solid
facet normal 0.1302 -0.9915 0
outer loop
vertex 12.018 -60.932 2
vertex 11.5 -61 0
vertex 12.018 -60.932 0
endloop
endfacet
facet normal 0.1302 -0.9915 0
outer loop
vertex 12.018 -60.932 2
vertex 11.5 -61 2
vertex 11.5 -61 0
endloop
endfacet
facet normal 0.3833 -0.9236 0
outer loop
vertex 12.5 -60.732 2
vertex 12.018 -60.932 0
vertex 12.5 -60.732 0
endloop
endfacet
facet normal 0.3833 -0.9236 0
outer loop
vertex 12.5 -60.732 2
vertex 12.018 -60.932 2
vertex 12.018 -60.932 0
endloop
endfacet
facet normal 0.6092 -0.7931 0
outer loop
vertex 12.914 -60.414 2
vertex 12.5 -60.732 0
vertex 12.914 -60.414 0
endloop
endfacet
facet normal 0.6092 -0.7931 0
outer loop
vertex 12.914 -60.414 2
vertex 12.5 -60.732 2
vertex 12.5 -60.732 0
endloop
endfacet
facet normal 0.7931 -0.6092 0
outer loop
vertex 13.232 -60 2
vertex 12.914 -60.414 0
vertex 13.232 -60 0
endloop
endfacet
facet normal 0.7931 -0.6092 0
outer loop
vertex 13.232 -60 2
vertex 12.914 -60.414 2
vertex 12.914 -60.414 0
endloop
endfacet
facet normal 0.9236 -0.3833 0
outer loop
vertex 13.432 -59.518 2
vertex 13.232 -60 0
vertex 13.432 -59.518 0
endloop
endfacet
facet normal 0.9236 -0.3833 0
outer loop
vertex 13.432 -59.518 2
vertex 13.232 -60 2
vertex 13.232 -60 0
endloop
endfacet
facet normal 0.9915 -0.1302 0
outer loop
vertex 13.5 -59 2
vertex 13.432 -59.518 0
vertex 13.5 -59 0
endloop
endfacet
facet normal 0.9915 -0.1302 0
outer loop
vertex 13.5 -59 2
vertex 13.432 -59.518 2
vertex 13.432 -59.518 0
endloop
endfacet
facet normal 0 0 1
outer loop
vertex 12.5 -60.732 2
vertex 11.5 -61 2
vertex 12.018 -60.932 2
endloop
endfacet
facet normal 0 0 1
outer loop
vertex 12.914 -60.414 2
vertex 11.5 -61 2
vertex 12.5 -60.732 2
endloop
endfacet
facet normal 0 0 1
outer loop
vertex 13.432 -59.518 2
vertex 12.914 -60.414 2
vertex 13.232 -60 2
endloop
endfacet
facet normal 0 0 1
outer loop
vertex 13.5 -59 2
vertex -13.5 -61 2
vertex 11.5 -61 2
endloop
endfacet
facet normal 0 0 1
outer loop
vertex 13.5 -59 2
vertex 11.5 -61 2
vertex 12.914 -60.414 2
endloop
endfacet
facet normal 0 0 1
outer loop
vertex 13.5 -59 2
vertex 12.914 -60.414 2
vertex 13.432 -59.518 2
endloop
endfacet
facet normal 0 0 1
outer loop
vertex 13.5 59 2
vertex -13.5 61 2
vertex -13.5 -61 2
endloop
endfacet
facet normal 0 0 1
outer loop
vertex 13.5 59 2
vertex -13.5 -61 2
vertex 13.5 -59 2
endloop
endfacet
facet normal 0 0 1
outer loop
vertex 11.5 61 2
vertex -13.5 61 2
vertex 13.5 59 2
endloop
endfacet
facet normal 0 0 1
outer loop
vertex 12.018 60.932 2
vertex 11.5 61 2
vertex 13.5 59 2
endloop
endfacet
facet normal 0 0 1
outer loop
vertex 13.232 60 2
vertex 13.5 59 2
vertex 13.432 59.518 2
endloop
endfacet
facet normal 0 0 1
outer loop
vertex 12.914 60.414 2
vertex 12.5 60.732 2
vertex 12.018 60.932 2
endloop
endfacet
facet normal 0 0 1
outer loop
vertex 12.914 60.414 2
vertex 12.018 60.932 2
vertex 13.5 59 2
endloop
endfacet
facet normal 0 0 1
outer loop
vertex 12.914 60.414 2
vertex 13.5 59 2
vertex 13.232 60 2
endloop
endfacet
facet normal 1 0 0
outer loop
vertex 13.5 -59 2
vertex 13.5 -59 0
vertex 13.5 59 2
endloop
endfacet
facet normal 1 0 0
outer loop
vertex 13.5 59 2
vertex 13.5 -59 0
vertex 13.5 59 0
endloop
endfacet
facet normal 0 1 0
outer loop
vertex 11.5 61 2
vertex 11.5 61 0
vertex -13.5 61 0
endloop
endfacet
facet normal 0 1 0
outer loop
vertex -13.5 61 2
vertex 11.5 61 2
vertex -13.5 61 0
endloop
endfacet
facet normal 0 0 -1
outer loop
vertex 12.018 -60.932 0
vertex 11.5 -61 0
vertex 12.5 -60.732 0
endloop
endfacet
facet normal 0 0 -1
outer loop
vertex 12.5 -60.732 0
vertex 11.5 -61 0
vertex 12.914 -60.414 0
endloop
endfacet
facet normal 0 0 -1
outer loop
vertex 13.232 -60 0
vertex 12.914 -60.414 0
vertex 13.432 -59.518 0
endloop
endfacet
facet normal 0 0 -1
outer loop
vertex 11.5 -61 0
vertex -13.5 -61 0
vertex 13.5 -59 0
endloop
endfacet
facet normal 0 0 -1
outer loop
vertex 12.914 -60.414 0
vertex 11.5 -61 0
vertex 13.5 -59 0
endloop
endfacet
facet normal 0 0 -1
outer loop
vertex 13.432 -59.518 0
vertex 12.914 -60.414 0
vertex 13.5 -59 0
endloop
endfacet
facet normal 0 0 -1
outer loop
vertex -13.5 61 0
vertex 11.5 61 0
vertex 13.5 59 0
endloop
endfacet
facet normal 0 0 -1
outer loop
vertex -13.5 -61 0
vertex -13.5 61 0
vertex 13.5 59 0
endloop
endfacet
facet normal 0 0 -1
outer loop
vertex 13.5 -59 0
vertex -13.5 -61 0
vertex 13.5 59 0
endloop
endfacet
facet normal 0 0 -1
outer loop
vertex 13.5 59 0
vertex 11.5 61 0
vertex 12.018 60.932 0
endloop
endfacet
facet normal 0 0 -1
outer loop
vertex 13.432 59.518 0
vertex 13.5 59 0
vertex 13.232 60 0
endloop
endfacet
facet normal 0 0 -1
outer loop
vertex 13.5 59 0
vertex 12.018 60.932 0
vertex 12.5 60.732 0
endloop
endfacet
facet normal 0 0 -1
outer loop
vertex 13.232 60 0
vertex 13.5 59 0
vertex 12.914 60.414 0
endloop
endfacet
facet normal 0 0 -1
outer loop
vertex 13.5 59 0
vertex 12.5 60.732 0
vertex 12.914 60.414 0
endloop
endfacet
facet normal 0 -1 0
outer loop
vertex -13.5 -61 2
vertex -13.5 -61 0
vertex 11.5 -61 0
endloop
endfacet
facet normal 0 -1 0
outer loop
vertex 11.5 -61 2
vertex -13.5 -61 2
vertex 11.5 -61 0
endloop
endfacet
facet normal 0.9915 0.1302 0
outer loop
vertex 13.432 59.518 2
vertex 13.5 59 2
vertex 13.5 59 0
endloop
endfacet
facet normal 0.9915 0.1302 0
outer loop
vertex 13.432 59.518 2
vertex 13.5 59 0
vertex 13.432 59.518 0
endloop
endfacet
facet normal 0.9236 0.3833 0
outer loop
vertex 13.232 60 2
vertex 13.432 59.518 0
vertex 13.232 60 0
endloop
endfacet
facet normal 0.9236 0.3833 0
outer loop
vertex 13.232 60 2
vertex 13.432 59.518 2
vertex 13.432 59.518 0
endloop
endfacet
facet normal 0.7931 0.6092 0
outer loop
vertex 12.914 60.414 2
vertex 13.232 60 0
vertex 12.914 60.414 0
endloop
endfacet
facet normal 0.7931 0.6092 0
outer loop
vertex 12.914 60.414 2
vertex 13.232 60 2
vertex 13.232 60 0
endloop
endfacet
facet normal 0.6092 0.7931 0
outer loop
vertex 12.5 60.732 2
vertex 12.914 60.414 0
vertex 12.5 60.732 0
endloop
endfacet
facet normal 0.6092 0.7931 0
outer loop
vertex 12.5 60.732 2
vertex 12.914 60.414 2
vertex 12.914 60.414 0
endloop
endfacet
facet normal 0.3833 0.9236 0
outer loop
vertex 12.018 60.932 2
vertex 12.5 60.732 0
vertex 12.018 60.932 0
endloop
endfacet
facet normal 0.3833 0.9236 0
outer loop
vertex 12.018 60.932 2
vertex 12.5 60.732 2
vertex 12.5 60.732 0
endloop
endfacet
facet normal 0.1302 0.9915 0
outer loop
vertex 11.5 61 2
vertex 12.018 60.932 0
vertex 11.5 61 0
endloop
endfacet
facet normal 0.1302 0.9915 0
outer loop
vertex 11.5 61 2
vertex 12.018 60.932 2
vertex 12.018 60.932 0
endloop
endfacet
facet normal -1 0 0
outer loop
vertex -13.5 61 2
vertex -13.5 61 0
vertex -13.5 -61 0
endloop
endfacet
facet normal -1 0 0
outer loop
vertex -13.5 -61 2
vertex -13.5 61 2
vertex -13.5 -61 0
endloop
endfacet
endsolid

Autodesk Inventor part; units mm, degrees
ref_plane "YZ Plane" through (0, 0, 0) normal (1, 0, 0) x (0, 1, 0)
ref_plane "XZ Plane" through (0, 0, 0) normal (0, 1, 0) x (-1, 0, 0)
ref_plane "XY Plane" through (0, 0, 0) normal (0, 0, 1) x (1, 0, 0)
sketch "Sketch1" plane through (0, 0, 0) normal (0, 0, 1) x (1, 0, 0)
  line L0 (-13.5, -61) -> (13.5, -61)
  line L1 (13.5, -61) -> (13.5, 61)
  line L2 (13.5, 61) -> (-13.5, 61)
  line L3 (-13.5, 61) -> (-13.5, -61)
  line L4 (-13.5, -61) -> (13.5, 61) construction
  line L5 (13.5, -61) -> (-13.5, 61) construction
  circle A0 centre (-1.5, 51) radius 5.5
  circle A1 centre (-1.5, -51) radius 5.5
  line L6 (-13.5, 0) -> (13.5, 0) construction
  point P0 (0, 0)
  point P1 (0, 0)
  dimension "d0" = 27
  dimension "d1" = 122
  dimension "d12" = 11
  dimension "d13" = 102
  dimension "d15" = 15
extrude "Plate1" add sketch "Sketch1" along normal blind 2 contours L3 L2 L1 L0 | A0 | A1
sketch "Sketch2" plane through (0, 0, 0) normal (0, 0, -1) x (-1, 0, 0)
  line L0 (6.5, 41) -> (206.5, 41) construction
  line L1 (206.5, 41) -> (206.5, 21) construction
  line L2 (206.5, 21) -> (6.5, 21) construction
  line L3 (6.5, 21) -> (6.5, 41) construction
  line L4 (-13.5, 61) -> (13.5, 61) projected
  line L5 (-13.5, -61) -> (-13.5, 61) projected
  point P0 (0, 0)
  point P1 (-48, 100)
  point P2 (13.5, 61)
  point P3 (-50, 98)
  dimension "d6" = 200
  dimension "d9" = 20
  dimension "d10" = 20
  dimension "d11" = 20
mark "Mark1"
fillet "Corner Round1" radius 2 2 edges at (13.5, -61, 1) (13.5, 61, 1)
equation "\"d2\" = Thickness"
equation "\"BendReliefWidth\" = Thickness"
equation "\"BendReliefDepth\" = 0.5 * Thickness"
equation "\"CornerReliefSize\" = 4 * Thickness"
equation "\"MinimumRemnant\" = 2 * Thickness"
equation "\"TransitionRadius\" = BendRadius"
equation "\"JacobiRadiusSize\" = BendRadius"
equation "\"GapSize\" = Thickness"
equation "\"Thickness\" = 2"
equation "\"BendRadius\" = 2.75"
properties part number "TRM 036 box 1" material "AISI 304"
